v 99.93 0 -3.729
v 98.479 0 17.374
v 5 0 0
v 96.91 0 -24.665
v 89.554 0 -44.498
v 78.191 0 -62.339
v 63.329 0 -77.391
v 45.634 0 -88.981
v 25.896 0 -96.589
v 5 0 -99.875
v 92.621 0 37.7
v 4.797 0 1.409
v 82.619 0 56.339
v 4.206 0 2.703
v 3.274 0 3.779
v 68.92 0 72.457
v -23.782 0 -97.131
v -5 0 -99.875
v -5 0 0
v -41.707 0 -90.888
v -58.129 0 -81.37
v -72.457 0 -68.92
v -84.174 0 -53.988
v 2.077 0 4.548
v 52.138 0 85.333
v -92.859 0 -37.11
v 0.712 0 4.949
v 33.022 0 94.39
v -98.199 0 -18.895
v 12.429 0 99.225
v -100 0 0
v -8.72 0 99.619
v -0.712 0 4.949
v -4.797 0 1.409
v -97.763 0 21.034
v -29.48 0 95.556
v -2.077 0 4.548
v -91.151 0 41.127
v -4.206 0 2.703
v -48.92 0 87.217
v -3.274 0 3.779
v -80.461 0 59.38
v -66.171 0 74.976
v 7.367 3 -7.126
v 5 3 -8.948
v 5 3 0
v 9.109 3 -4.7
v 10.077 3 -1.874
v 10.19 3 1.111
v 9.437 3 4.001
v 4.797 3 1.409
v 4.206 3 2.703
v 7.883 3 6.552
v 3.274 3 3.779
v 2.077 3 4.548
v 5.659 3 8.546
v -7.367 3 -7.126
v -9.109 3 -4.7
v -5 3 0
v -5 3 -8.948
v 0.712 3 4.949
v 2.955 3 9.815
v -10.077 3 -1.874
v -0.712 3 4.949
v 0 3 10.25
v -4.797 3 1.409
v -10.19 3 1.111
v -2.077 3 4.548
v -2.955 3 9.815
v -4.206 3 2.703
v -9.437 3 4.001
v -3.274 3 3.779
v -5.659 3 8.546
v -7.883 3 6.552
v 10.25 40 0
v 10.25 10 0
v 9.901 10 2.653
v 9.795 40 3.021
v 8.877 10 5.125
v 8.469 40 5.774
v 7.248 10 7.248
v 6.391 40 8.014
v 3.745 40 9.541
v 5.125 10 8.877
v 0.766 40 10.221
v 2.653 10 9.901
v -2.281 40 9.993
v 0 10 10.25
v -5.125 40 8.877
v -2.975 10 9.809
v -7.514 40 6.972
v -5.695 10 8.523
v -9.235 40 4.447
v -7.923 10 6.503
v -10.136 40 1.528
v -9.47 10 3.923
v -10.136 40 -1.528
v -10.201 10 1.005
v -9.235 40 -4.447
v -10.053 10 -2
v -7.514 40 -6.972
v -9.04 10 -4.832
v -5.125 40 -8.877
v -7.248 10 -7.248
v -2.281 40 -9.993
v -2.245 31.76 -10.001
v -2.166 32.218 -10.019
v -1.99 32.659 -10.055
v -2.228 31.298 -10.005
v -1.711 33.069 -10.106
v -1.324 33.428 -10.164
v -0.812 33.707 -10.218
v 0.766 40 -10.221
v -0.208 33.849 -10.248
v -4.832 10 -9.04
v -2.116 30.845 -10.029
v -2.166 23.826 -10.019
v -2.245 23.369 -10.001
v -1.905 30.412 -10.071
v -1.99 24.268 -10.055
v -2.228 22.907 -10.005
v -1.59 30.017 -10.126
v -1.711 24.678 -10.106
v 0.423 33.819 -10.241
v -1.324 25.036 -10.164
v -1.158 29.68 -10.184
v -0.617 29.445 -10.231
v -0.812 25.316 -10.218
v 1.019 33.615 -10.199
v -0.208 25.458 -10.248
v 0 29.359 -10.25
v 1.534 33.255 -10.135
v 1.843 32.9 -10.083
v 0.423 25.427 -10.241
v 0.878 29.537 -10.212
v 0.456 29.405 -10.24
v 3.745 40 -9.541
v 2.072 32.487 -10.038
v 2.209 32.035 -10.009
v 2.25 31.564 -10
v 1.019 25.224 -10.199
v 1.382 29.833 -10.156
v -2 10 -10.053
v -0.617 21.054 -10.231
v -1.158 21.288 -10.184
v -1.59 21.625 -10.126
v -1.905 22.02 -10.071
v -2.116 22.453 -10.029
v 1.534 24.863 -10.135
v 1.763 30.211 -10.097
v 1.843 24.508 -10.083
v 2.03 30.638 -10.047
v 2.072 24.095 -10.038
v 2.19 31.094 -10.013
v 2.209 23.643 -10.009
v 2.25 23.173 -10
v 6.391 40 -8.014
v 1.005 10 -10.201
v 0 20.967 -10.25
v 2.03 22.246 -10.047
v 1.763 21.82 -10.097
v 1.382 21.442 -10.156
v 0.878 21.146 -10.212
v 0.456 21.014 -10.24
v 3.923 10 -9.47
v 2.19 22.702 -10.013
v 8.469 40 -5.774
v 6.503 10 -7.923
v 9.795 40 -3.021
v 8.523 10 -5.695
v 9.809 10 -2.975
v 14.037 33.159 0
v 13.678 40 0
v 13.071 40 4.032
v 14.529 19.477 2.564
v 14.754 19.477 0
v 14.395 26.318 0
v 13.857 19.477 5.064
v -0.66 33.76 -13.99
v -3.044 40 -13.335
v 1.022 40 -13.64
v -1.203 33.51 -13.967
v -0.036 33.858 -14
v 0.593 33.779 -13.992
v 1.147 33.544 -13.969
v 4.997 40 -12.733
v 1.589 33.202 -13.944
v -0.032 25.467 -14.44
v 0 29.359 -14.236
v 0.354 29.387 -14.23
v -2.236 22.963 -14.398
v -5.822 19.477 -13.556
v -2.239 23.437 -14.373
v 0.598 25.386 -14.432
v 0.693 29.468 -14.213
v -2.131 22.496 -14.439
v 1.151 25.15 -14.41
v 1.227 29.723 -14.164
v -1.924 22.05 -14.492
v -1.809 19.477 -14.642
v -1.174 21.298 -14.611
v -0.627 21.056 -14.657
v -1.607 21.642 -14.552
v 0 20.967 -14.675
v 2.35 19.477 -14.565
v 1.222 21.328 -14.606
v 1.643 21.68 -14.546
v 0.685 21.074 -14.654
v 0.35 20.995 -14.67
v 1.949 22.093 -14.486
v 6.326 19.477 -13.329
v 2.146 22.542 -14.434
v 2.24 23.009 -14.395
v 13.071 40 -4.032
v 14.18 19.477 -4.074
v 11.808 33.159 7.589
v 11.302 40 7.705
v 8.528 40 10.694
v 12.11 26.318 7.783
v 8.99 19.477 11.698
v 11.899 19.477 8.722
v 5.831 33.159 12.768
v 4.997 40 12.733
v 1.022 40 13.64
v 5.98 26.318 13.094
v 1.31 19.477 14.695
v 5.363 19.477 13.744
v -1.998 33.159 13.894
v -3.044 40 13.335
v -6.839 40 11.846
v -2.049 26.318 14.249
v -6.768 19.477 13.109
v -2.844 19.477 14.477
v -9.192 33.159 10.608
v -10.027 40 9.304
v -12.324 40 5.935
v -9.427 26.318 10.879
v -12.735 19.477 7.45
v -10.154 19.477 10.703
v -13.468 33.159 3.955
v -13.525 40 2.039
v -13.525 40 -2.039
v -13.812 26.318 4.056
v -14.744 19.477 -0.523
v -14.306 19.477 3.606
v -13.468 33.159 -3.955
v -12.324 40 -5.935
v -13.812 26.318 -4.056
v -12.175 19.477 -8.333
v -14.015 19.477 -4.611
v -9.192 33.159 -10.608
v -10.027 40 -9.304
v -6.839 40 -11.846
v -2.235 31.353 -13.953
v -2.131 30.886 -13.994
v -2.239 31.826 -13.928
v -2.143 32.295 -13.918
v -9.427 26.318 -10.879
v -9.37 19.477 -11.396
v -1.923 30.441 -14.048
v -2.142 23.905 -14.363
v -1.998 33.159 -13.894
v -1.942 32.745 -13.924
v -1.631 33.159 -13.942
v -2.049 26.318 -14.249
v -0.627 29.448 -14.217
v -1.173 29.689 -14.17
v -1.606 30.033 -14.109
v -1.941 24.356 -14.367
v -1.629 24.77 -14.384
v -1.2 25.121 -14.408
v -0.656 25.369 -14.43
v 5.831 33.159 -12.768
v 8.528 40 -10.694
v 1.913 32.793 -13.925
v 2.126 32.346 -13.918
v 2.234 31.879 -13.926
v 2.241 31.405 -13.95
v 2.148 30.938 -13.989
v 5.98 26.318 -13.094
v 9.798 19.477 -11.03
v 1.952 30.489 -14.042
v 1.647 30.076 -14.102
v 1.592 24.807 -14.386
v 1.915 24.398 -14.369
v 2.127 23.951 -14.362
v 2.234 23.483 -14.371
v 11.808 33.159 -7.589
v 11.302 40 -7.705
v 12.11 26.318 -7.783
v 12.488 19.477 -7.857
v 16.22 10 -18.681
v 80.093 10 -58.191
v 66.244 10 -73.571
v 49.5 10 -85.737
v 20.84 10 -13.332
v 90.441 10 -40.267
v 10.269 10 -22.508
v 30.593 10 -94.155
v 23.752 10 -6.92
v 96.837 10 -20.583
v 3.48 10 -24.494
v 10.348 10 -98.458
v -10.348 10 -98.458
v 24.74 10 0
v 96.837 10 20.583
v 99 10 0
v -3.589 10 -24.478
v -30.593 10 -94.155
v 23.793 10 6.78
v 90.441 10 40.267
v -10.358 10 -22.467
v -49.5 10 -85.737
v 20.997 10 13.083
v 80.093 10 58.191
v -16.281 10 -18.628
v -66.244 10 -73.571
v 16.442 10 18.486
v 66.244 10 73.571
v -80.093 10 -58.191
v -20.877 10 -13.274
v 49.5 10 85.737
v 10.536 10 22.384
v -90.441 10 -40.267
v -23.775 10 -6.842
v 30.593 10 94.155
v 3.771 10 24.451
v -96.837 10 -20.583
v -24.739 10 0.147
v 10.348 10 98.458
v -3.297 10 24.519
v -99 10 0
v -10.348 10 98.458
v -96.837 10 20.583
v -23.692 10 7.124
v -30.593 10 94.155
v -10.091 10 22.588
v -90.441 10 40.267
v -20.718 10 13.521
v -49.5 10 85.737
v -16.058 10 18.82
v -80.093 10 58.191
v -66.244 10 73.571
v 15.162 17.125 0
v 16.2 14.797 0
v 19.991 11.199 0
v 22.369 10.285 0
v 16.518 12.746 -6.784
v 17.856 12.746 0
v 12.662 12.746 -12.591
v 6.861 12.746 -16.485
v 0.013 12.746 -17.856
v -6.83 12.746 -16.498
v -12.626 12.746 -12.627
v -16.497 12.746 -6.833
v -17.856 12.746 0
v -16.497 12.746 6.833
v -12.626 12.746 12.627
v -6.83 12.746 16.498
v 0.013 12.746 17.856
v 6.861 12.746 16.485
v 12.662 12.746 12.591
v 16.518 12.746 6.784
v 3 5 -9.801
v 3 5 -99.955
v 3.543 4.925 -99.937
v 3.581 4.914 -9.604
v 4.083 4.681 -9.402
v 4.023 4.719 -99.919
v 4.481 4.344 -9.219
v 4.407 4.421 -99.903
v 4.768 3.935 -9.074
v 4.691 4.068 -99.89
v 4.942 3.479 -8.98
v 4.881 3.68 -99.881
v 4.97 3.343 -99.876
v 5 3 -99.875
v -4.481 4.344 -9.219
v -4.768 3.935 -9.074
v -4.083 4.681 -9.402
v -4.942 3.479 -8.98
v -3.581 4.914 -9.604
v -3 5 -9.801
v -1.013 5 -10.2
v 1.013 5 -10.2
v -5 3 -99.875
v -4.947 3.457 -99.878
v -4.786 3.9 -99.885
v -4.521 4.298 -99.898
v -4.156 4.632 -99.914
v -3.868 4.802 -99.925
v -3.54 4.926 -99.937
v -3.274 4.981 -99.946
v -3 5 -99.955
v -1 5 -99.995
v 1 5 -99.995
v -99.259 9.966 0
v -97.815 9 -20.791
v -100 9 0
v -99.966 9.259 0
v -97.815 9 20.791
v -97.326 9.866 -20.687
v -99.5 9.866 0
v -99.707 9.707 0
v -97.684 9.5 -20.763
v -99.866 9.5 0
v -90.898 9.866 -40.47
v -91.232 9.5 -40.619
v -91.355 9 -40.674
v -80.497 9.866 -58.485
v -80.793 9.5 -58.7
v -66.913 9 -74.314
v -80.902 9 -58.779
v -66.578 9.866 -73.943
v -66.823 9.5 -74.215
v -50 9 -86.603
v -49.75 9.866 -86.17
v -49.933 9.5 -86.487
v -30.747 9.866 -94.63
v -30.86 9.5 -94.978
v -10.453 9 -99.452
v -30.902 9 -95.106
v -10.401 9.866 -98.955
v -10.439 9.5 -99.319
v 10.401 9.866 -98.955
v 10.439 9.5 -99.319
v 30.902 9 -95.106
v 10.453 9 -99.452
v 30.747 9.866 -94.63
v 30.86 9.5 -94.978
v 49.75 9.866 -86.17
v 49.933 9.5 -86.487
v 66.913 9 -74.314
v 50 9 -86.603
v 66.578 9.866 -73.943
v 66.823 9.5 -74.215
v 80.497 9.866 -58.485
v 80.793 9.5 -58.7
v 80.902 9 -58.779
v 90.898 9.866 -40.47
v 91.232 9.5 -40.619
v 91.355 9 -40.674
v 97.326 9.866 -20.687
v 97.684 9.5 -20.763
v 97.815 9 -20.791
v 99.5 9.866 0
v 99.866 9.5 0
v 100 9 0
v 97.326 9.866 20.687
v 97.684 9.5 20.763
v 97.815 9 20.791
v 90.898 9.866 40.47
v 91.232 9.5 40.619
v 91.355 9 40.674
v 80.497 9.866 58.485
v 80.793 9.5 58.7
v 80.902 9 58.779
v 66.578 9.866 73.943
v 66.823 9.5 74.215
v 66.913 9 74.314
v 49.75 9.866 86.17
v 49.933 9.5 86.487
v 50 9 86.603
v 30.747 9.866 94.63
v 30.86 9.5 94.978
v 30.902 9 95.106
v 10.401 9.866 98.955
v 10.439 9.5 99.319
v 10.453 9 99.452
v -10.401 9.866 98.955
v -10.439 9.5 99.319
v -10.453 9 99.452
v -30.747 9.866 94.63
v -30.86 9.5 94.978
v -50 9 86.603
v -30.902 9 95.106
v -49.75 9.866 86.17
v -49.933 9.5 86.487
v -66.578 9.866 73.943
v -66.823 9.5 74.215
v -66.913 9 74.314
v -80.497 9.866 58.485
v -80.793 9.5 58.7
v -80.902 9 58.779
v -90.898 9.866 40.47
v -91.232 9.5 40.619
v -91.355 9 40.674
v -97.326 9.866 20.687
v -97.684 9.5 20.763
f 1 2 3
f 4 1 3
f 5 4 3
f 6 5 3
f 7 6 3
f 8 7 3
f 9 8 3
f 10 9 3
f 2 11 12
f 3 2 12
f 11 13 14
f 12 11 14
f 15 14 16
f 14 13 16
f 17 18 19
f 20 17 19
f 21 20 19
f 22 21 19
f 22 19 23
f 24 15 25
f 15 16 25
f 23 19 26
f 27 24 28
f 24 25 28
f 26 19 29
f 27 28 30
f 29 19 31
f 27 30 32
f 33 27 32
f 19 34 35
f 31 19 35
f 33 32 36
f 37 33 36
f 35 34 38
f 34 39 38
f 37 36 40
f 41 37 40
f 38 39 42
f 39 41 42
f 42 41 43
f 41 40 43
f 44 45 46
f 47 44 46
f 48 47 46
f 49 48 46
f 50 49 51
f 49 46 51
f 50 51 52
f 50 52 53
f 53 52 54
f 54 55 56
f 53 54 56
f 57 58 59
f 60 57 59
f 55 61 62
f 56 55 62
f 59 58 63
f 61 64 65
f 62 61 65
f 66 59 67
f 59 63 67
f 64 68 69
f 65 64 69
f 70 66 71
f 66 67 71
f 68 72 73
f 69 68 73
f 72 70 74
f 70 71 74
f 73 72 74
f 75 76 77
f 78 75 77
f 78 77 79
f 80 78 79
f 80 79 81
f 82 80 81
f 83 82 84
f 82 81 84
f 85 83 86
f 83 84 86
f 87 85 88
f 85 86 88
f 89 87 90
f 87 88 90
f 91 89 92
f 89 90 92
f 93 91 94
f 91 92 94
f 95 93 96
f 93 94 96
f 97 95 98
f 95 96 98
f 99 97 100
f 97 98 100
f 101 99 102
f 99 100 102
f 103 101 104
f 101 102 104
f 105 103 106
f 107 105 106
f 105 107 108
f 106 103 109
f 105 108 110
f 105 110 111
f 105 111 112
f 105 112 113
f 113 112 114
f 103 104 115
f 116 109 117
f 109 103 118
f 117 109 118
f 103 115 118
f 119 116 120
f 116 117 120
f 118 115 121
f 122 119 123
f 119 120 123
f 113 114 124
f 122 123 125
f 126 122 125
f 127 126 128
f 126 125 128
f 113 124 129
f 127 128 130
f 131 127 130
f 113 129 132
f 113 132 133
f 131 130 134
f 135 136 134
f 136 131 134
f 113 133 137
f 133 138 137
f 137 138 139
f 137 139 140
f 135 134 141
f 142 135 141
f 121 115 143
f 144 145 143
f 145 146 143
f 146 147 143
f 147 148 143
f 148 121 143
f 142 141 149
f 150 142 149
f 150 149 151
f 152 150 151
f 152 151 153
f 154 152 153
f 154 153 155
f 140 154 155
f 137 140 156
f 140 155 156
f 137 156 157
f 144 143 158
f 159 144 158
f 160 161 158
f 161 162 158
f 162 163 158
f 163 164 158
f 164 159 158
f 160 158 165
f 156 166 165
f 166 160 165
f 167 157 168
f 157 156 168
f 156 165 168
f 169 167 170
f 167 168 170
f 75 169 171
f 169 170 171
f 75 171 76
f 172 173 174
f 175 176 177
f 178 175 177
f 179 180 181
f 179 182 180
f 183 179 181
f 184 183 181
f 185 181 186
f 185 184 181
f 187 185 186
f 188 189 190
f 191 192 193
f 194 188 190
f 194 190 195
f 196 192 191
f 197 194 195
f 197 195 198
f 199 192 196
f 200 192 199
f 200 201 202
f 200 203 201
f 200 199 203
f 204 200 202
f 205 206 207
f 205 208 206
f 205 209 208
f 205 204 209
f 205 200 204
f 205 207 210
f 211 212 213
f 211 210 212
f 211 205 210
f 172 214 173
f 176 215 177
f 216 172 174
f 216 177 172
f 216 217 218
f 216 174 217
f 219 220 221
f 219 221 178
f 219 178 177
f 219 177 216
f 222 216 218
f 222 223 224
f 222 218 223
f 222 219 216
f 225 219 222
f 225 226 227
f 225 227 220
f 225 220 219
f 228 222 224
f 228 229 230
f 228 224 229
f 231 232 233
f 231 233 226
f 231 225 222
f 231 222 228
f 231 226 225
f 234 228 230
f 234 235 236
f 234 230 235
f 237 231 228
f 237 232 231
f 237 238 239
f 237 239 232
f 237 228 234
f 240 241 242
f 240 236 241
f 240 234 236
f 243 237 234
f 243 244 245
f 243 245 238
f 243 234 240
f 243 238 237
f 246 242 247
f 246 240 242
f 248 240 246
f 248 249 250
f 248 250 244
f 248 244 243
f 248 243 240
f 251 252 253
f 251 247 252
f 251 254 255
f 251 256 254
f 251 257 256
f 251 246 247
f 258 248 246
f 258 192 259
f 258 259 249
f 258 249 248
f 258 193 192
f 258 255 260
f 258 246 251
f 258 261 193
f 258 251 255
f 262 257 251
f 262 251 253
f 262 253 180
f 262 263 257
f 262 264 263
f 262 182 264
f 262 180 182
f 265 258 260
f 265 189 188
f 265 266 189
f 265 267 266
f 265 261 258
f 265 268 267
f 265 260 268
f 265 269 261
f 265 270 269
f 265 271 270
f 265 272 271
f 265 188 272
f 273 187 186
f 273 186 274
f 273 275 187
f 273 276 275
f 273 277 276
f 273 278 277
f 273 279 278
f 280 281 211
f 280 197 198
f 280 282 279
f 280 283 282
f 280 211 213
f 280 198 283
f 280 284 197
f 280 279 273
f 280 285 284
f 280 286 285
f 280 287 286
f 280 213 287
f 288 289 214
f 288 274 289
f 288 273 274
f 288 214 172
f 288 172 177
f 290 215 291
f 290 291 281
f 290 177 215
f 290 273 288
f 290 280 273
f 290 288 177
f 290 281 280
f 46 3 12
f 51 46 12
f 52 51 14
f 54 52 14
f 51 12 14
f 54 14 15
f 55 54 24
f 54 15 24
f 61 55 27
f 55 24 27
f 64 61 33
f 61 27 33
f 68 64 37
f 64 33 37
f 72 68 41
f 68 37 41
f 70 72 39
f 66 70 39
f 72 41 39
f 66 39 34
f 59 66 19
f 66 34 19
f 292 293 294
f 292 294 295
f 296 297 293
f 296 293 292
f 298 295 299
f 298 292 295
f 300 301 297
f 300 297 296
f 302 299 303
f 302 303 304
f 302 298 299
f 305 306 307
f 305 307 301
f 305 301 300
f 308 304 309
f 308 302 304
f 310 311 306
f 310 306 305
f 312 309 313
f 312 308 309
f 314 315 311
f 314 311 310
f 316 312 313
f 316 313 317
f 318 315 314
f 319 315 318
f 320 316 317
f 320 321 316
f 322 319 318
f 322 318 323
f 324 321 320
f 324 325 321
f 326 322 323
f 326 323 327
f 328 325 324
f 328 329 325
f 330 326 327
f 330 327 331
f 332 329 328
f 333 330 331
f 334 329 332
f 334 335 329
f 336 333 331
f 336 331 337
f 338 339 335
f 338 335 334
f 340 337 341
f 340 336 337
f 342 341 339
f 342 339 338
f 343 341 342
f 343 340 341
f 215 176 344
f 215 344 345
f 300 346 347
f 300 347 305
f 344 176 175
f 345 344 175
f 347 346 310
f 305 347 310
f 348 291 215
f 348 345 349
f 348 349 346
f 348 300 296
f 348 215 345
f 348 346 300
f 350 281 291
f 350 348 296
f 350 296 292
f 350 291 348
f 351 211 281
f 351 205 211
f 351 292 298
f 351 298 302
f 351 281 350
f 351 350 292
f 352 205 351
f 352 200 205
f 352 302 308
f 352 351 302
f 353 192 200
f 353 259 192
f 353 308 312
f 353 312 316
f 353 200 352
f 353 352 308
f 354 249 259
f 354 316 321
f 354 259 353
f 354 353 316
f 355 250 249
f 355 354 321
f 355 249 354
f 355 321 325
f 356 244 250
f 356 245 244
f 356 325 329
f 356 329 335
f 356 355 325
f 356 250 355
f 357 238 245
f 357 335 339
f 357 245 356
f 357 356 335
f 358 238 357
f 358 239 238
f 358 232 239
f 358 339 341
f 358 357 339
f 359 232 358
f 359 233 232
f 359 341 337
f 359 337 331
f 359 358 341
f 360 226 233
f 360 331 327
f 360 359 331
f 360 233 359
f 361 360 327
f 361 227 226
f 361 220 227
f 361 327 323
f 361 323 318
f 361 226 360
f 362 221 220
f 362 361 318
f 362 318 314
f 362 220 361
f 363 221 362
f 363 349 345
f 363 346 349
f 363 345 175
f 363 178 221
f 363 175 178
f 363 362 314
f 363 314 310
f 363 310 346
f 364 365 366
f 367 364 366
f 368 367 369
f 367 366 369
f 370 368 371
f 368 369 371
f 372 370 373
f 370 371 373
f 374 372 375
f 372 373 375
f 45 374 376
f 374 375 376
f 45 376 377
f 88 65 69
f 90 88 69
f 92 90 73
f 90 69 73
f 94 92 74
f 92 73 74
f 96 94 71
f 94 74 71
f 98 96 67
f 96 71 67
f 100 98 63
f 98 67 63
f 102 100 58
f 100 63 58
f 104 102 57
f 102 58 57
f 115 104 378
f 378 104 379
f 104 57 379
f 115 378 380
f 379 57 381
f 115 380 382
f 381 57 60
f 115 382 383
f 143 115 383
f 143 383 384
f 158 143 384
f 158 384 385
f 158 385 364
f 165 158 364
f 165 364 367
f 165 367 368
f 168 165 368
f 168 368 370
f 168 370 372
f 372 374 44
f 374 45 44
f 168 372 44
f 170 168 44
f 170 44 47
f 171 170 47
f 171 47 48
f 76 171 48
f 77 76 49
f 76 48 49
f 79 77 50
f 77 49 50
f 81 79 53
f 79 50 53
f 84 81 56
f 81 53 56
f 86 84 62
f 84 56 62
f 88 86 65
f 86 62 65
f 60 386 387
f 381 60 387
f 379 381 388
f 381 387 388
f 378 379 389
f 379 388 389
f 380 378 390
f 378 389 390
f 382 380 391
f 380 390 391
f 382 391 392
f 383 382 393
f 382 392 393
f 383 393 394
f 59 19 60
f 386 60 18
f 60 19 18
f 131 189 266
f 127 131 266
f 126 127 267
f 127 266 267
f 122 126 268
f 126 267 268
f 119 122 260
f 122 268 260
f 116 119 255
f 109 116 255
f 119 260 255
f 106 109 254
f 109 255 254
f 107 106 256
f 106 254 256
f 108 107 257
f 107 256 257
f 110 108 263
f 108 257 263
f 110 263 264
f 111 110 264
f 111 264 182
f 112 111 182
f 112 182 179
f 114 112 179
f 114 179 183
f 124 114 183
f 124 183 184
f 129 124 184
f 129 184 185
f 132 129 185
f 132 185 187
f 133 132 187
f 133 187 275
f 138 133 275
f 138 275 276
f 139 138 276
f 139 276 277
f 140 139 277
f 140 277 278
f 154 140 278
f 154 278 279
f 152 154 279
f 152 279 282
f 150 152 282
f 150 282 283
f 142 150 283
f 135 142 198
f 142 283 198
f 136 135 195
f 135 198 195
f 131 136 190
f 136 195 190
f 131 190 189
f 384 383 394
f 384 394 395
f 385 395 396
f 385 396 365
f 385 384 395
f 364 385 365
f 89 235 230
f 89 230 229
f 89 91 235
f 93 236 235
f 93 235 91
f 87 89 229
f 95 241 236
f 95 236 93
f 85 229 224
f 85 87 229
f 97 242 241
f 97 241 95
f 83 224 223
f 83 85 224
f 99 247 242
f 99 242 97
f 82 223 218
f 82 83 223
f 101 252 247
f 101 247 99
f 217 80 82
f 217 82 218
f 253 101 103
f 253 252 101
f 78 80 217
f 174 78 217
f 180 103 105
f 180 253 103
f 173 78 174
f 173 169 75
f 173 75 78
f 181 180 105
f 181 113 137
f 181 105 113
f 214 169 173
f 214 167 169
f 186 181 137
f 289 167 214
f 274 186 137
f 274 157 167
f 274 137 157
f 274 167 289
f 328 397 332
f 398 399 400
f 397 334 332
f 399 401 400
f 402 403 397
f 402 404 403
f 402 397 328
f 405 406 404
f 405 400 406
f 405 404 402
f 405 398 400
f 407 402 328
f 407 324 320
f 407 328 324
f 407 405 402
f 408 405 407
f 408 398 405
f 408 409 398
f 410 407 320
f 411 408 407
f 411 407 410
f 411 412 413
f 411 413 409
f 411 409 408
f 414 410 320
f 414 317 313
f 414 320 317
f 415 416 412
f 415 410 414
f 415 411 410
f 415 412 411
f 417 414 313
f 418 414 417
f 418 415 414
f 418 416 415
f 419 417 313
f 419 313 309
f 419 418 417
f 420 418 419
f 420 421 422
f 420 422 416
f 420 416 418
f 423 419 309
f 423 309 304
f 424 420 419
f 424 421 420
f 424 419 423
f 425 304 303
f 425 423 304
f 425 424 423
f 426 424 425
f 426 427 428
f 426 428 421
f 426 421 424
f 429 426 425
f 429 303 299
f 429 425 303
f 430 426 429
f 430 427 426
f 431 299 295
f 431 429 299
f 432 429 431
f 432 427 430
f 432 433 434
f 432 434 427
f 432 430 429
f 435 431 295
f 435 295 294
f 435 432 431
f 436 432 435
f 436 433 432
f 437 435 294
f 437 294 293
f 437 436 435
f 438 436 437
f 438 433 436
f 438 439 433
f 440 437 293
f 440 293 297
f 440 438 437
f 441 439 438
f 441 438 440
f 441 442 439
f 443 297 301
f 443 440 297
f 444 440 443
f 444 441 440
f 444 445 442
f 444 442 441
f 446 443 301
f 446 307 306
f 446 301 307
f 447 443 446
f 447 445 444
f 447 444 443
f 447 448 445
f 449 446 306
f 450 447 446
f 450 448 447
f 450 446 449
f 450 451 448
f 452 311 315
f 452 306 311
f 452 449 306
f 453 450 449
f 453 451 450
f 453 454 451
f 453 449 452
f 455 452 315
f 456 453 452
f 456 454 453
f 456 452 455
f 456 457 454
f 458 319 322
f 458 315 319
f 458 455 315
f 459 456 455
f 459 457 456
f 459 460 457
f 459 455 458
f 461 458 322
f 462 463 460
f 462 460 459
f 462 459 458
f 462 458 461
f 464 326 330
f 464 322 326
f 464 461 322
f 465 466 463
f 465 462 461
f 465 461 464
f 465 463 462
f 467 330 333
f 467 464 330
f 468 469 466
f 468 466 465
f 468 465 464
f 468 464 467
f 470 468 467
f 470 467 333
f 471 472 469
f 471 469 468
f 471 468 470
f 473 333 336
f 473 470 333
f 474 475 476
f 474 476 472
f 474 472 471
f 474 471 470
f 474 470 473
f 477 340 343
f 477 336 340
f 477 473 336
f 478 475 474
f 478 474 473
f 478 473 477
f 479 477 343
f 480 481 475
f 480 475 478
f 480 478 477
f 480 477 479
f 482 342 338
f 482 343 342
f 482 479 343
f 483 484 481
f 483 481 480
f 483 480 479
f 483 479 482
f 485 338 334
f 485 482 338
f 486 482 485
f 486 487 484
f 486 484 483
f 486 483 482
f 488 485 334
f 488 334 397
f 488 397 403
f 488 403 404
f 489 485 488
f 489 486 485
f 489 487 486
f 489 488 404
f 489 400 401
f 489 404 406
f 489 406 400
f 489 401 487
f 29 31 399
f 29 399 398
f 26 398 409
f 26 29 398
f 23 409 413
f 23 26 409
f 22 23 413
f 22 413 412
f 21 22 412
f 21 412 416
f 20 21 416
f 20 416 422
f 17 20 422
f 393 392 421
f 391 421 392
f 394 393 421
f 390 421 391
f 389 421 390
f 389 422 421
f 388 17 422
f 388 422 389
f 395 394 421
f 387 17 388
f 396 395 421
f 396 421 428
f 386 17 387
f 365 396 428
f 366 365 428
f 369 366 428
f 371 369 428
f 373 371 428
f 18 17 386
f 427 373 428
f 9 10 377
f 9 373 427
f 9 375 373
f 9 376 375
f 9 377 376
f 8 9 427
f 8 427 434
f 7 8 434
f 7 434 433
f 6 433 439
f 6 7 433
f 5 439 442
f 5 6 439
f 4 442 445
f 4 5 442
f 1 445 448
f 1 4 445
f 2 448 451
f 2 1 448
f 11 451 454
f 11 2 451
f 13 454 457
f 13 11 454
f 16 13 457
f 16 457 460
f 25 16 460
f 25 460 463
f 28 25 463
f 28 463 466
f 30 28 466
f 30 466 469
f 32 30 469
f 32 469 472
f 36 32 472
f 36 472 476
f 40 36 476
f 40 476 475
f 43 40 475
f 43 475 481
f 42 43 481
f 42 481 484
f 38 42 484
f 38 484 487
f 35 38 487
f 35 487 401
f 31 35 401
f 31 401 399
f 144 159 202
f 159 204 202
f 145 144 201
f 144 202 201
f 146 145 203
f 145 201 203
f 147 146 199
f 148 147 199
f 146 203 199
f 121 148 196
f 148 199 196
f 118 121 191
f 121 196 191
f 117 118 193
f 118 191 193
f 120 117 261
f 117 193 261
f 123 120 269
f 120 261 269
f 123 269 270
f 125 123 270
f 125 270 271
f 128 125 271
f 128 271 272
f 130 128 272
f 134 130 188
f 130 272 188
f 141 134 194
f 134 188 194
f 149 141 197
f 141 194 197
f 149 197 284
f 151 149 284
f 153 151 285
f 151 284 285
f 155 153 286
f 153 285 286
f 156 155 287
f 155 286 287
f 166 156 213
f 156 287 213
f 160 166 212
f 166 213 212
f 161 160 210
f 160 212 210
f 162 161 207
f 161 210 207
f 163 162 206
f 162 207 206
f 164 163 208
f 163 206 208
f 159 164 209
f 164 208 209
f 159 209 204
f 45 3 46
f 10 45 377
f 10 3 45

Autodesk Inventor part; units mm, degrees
ref_plane "YZ Plane" through (0, 0, 0) normal (1, 0, 0) x (0, 1, 0)
ref_plane "XZ Plane" through (0, 0, 0) normal (0, 1, 0) x (-1, 0, 0)
ref_plane "XY Plane" through (0, 0, 0) normal (0, 0, 1) x (1, 0, 0)
sketch "Boceto2" plane through (0, 0, 0) normal (0, 1, 0) x (-1, 0, 0)
  circle A0 centre (0, 0) radius 100
  dimension "d11" = 200
extrude "Extrusión2" add sketch "Boceto2" along normal blind 10
sketch "Boceto3" plane through (0, 10, 0) normal (0, 1, 0) x (1, 0, 0)
  circle A0 centre (0, 0) radius 100 projected
hole "Agujero1" at (0, 10, 0) direction (0, -1, 0) diameter 20.5 depth 7
sketch "Boceto4" plane through (0, 10, 0) normal (0, 1, 0) x (1, 0, 0)
  circle A0 centre (0, 0) radius 10.25 projected
  circle A1 centre (0, 0) radius 100 projected
  circle A2 centre (0, 0) radius 15.25
  dimension "d21" = 5
extrude "Extrusión3" add sketch "Boceto4" along normal blind 30 contours A2
sketch "Boceto5" plane through (0, 0, 0) normal (0, 0, 1) x (1, 0, 0)
  line L0 (15.25, 40) -> (-15.25, 40) projected
  line L1 (0, 40) -> (0, 20)
  line L2 (0, 40) -> (0, 31.6087)
  line L3 (0, 31.6087) -> (0, 23.2173)
  circle A0 centre (0, 23.2173) radius 2.25
  circle A1 centre (0, 31.6087) radius 2.25
  point P0 (0, 0)
  point P1 (-15.25, 20)
  point P2 (15.25, 20)
  dimension "d25" = 8.3913
  dimension "d26" = 8.3913
  dimension "d27" = 4.5
  dimension "d28" = 4.5
fillet "Empalme2" radius 1 1 edges at (100, 10, 0)
chamfer "Chaflán1" distance 30 angle 3 1 edges at (-15.25, 40, 0) measured on face at (15.2005, 30, 1.2271)
hole "Agujero3" at (0, 31.6087, 0) at (0, 23.2173, 0) direction (0, 0, -1) diameter 4.5 end through all
fillet "Empalme3" radius 10 2 edges at (-15.25, 10.0005, 0) (-15.25, 10, 0)
sketch "Boceto6" plane through (0, 0, 0) normal (0, -1, 0) x (1, 0, 0)
  circle A0 centre (0, 0) radius 100 projected
  circle A1 centre (0, 0) radius 5
  line L0 (5, 0) -> (5, -105)
  line L1 (-5, 0) -> (-5, -105)
  point P0 (-5, -99.8749)
  point P1 (5, -99.8749)
  dimension "d48" = 10
  dimension "d49" = 105
  dimension "d50" = 10
extrude "Extrusión4" cut sketch "Boceto6" against normal blind 5 contours L1 A1 L0 A0 | A1 picked at (0.2009, -68.3119)
sketch "Boceto7" plane through (-5, 0, 0) normal (1, 0, 0) x (0, 0, -1)
  point P0 (0, 0)
fillet "Empalme4" radius 2 2 edges at (-5, 5, -54.4113) (5, 5, -54.4113)
properties part number "Pie2"
